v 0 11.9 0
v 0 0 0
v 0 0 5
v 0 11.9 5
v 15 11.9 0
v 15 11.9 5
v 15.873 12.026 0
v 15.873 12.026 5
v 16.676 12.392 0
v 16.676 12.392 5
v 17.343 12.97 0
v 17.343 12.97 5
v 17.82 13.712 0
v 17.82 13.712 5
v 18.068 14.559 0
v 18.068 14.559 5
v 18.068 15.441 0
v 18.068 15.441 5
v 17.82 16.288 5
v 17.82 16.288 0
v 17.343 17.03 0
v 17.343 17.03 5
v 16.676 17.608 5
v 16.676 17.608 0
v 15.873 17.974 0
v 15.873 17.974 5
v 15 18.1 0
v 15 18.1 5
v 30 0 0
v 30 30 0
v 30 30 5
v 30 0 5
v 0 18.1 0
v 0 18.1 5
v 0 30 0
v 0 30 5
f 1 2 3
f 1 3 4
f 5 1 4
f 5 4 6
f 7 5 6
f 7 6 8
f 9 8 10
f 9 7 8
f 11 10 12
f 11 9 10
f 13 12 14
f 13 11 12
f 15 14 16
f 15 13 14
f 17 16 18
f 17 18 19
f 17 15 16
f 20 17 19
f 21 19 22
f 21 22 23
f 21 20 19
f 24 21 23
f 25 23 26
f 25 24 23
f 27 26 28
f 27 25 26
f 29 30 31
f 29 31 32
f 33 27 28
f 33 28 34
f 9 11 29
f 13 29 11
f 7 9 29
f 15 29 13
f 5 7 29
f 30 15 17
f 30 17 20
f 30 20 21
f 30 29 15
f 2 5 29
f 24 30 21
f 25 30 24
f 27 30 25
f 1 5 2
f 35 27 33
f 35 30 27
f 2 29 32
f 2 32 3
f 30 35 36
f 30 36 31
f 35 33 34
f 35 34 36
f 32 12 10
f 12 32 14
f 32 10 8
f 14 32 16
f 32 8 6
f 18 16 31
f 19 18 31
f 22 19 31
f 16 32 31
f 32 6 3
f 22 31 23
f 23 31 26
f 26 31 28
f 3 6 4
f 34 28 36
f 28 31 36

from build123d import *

# Parameters (mm, degrees)
BOSS_EXTRUDE1_DEPTH = 5


with BuildPart() as part:
    # Sketch1 → Boss-Extrude1 (new body)
    with BuildSketch(Plane.XY):
        with BuildLine():
            Line((15, 18.1), (0, 18.1))
            Line((0, 18.1), (0, 30))
            Line((0, 30), (30, 30))
            Line((30, 30), (30, 0))
            Line((30, 0), (0, 0))
            Line((0, 0), (0, 11.9))
            Line((0, 11.9), (15, 11.9))
            ThreePointArc((15, 11.9), (18.1, 15), (15, 18.1))
        make_face()
    extrude(amount=BOSS_EXTRUDE1_DEPTH)


solid = part.part
